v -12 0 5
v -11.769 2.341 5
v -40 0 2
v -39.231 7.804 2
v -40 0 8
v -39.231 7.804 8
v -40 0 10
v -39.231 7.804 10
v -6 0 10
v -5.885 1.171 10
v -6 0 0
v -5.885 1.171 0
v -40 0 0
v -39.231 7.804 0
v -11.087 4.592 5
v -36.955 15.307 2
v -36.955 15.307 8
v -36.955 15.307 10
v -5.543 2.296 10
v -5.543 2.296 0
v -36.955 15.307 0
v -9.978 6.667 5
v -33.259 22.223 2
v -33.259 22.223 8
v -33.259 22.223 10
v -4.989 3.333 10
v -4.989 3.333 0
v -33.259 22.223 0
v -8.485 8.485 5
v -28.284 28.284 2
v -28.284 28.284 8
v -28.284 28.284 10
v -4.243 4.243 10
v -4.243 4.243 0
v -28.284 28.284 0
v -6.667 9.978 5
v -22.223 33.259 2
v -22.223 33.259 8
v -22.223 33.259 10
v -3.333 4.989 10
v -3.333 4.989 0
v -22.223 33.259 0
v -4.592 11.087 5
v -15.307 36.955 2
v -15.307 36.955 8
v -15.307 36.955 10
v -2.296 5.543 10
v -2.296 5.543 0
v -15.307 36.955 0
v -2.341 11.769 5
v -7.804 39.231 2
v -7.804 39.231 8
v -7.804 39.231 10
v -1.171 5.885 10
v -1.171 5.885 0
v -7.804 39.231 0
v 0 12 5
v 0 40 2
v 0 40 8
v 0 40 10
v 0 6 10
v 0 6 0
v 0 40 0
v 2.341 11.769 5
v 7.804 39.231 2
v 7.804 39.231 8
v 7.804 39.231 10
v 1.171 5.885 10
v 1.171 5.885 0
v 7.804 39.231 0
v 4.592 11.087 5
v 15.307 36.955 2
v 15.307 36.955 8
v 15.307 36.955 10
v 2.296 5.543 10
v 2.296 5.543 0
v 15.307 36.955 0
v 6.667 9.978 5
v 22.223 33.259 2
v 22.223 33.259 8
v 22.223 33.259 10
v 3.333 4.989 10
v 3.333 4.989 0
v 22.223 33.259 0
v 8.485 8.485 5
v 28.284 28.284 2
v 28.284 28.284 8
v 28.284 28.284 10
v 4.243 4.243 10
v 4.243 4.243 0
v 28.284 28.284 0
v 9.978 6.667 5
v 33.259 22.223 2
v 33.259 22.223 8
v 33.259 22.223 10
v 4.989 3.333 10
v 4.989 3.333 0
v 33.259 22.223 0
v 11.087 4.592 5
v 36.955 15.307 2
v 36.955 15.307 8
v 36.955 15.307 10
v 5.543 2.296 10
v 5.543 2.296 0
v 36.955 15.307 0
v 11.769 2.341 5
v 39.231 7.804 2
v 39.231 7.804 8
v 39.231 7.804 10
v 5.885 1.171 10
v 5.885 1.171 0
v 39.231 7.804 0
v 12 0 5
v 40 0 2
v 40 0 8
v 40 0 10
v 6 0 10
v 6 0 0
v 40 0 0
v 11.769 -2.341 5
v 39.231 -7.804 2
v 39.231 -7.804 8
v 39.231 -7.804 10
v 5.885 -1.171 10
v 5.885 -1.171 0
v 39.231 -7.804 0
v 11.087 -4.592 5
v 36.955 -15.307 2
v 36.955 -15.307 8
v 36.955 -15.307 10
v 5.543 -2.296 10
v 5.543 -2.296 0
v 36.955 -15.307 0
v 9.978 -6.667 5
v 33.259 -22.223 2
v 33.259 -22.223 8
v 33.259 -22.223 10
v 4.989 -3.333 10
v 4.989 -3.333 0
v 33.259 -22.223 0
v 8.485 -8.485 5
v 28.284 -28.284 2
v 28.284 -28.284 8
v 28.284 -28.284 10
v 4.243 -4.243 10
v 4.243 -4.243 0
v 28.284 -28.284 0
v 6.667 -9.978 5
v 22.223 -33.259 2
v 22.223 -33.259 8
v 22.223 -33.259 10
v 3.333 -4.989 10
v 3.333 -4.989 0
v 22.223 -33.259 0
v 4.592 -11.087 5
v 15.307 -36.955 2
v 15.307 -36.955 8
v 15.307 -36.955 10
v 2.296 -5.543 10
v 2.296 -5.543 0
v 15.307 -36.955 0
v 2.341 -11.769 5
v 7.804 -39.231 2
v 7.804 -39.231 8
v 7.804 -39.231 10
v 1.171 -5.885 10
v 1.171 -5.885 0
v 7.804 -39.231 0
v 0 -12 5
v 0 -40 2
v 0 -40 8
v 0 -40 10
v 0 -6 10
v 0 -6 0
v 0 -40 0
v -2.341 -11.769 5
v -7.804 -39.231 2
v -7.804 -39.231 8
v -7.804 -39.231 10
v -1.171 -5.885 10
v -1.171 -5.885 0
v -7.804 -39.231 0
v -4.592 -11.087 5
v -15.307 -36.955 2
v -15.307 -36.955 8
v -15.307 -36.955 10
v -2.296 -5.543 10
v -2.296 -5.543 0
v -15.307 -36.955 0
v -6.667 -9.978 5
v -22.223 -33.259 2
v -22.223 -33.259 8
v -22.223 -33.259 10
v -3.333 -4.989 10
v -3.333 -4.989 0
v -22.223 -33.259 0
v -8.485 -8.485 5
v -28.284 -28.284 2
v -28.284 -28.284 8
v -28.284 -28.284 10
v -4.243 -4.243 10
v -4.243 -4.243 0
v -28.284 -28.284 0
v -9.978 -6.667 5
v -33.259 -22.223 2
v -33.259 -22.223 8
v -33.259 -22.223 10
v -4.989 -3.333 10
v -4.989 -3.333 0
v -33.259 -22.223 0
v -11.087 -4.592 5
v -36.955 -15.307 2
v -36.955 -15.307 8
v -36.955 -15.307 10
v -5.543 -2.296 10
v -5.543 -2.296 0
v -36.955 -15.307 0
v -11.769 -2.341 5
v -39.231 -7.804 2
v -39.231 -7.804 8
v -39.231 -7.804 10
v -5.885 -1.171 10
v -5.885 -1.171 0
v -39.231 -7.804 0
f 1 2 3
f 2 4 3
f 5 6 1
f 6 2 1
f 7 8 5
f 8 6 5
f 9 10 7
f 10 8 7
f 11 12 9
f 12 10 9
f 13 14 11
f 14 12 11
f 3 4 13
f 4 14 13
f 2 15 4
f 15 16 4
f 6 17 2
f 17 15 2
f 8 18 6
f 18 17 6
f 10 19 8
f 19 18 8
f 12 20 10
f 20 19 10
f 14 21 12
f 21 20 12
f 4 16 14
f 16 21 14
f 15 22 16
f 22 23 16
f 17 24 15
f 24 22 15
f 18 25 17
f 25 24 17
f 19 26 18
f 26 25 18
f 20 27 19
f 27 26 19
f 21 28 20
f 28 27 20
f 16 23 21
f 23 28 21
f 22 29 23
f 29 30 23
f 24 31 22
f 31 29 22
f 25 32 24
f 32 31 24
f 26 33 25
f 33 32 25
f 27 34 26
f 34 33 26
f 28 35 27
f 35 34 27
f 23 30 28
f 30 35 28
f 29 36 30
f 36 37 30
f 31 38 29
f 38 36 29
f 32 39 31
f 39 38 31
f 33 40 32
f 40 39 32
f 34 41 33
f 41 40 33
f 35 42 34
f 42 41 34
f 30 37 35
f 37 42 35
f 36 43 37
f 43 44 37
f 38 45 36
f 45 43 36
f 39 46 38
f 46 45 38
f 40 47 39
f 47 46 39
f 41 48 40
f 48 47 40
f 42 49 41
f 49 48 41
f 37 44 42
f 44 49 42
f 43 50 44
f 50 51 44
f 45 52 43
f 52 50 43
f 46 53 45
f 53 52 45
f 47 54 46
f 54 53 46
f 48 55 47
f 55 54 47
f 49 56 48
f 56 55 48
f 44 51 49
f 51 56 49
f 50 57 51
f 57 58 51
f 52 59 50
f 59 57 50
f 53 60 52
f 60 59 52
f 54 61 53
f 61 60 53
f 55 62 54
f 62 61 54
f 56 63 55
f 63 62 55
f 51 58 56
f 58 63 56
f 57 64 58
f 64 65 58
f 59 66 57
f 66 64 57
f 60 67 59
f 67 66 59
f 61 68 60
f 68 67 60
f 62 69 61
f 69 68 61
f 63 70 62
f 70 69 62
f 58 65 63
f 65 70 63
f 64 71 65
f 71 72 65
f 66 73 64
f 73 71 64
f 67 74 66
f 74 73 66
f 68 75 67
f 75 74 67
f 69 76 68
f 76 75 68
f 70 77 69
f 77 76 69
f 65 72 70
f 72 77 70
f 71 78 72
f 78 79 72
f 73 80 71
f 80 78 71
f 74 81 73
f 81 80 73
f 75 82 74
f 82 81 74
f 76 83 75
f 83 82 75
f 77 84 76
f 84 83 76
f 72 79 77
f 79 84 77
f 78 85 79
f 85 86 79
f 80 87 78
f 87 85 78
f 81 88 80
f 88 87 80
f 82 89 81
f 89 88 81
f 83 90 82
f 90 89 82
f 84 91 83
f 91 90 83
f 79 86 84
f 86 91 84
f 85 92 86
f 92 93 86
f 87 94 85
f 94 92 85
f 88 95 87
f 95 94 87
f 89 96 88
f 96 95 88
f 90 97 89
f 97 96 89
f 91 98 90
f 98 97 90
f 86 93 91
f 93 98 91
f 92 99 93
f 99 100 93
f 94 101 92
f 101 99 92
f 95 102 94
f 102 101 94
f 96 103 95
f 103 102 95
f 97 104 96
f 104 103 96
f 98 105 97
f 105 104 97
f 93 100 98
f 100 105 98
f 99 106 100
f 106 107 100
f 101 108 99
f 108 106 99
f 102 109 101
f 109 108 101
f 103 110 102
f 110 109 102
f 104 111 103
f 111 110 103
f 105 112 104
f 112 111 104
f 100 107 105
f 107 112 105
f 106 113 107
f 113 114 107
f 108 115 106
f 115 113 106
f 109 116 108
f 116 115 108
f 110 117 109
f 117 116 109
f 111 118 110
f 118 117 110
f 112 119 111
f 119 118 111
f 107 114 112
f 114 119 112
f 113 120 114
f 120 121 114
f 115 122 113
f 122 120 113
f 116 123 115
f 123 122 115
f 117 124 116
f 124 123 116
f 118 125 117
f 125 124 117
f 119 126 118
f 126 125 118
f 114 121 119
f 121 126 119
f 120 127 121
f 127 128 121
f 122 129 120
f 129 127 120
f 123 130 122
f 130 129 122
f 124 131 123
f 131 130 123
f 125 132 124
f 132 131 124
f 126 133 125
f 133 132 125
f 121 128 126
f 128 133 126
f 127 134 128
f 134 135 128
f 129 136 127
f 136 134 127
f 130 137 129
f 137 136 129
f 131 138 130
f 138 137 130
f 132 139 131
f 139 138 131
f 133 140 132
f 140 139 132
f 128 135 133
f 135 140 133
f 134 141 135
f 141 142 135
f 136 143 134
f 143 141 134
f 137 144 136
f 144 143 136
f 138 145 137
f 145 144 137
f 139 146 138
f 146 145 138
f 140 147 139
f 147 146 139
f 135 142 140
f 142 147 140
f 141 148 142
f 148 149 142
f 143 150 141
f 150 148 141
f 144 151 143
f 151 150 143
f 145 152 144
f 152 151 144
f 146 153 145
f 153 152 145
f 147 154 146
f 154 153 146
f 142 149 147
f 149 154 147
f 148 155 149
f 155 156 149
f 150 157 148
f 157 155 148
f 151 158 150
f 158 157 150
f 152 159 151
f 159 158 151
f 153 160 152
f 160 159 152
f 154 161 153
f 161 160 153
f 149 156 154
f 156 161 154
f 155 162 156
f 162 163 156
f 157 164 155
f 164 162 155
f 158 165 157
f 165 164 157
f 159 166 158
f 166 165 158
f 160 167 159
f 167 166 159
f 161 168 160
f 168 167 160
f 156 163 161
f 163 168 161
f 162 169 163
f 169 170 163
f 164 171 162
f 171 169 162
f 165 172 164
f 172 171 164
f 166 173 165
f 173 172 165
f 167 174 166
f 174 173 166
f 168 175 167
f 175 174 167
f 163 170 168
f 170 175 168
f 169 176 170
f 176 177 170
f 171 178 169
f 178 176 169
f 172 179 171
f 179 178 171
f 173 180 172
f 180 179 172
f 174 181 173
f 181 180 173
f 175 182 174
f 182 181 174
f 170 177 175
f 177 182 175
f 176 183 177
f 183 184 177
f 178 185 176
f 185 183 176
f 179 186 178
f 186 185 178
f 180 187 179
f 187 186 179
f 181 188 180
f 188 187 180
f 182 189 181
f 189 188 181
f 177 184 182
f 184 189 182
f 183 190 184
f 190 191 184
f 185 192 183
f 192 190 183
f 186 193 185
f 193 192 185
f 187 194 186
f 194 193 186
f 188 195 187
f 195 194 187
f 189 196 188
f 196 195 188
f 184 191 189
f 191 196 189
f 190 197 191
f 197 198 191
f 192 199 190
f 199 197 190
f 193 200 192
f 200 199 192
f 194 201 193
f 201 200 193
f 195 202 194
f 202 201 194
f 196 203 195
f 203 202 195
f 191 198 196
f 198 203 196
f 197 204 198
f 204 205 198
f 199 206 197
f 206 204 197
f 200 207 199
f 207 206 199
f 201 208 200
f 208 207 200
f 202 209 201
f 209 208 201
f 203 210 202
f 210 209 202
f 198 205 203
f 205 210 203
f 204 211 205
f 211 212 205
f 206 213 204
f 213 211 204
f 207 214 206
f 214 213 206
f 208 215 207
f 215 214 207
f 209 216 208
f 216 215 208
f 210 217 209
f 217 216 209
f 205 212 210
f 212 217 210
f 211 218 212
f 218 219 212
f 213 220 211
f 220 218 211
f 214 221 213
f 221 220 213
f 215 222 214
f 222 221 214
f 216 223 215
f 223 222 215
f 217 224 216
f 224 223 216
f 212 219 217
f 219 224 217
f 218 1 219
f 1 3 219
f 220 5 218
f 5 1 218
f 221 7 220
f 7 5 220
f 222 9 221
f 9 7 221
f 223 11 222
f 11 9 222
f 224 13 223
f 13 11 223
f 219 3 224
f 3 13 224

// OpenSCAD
$fn = 32;

// ----------------------------------------------------------------------
// Revolved part: V-groove pulley R40
// ----------------------------------------------------------------------

// --- parameters (mm) ---
bore_r = 6;               // bore radius
rim_r = 40;               // rim radius
rim_t = 10;               // rim width
groove_r = 12;            // groove root radius
groove_w = 3;             // groove half width
revolve_angle = 360;      // revolve sweep, degrees

bore_d = 2 * bore_r;
rim_d = 2 * rim_r;
groove_d = 2 * groove_r;

profile = [[6, 0], [40, 0], [40, 2], [12, 5], [40, 8], [40, 10], [6, 10]];  // primary outline, 7 points, counter clockwise

// --- the one profile operation ---
rotate_extrude(angle = revolve_angle) polygon(points = profile);
